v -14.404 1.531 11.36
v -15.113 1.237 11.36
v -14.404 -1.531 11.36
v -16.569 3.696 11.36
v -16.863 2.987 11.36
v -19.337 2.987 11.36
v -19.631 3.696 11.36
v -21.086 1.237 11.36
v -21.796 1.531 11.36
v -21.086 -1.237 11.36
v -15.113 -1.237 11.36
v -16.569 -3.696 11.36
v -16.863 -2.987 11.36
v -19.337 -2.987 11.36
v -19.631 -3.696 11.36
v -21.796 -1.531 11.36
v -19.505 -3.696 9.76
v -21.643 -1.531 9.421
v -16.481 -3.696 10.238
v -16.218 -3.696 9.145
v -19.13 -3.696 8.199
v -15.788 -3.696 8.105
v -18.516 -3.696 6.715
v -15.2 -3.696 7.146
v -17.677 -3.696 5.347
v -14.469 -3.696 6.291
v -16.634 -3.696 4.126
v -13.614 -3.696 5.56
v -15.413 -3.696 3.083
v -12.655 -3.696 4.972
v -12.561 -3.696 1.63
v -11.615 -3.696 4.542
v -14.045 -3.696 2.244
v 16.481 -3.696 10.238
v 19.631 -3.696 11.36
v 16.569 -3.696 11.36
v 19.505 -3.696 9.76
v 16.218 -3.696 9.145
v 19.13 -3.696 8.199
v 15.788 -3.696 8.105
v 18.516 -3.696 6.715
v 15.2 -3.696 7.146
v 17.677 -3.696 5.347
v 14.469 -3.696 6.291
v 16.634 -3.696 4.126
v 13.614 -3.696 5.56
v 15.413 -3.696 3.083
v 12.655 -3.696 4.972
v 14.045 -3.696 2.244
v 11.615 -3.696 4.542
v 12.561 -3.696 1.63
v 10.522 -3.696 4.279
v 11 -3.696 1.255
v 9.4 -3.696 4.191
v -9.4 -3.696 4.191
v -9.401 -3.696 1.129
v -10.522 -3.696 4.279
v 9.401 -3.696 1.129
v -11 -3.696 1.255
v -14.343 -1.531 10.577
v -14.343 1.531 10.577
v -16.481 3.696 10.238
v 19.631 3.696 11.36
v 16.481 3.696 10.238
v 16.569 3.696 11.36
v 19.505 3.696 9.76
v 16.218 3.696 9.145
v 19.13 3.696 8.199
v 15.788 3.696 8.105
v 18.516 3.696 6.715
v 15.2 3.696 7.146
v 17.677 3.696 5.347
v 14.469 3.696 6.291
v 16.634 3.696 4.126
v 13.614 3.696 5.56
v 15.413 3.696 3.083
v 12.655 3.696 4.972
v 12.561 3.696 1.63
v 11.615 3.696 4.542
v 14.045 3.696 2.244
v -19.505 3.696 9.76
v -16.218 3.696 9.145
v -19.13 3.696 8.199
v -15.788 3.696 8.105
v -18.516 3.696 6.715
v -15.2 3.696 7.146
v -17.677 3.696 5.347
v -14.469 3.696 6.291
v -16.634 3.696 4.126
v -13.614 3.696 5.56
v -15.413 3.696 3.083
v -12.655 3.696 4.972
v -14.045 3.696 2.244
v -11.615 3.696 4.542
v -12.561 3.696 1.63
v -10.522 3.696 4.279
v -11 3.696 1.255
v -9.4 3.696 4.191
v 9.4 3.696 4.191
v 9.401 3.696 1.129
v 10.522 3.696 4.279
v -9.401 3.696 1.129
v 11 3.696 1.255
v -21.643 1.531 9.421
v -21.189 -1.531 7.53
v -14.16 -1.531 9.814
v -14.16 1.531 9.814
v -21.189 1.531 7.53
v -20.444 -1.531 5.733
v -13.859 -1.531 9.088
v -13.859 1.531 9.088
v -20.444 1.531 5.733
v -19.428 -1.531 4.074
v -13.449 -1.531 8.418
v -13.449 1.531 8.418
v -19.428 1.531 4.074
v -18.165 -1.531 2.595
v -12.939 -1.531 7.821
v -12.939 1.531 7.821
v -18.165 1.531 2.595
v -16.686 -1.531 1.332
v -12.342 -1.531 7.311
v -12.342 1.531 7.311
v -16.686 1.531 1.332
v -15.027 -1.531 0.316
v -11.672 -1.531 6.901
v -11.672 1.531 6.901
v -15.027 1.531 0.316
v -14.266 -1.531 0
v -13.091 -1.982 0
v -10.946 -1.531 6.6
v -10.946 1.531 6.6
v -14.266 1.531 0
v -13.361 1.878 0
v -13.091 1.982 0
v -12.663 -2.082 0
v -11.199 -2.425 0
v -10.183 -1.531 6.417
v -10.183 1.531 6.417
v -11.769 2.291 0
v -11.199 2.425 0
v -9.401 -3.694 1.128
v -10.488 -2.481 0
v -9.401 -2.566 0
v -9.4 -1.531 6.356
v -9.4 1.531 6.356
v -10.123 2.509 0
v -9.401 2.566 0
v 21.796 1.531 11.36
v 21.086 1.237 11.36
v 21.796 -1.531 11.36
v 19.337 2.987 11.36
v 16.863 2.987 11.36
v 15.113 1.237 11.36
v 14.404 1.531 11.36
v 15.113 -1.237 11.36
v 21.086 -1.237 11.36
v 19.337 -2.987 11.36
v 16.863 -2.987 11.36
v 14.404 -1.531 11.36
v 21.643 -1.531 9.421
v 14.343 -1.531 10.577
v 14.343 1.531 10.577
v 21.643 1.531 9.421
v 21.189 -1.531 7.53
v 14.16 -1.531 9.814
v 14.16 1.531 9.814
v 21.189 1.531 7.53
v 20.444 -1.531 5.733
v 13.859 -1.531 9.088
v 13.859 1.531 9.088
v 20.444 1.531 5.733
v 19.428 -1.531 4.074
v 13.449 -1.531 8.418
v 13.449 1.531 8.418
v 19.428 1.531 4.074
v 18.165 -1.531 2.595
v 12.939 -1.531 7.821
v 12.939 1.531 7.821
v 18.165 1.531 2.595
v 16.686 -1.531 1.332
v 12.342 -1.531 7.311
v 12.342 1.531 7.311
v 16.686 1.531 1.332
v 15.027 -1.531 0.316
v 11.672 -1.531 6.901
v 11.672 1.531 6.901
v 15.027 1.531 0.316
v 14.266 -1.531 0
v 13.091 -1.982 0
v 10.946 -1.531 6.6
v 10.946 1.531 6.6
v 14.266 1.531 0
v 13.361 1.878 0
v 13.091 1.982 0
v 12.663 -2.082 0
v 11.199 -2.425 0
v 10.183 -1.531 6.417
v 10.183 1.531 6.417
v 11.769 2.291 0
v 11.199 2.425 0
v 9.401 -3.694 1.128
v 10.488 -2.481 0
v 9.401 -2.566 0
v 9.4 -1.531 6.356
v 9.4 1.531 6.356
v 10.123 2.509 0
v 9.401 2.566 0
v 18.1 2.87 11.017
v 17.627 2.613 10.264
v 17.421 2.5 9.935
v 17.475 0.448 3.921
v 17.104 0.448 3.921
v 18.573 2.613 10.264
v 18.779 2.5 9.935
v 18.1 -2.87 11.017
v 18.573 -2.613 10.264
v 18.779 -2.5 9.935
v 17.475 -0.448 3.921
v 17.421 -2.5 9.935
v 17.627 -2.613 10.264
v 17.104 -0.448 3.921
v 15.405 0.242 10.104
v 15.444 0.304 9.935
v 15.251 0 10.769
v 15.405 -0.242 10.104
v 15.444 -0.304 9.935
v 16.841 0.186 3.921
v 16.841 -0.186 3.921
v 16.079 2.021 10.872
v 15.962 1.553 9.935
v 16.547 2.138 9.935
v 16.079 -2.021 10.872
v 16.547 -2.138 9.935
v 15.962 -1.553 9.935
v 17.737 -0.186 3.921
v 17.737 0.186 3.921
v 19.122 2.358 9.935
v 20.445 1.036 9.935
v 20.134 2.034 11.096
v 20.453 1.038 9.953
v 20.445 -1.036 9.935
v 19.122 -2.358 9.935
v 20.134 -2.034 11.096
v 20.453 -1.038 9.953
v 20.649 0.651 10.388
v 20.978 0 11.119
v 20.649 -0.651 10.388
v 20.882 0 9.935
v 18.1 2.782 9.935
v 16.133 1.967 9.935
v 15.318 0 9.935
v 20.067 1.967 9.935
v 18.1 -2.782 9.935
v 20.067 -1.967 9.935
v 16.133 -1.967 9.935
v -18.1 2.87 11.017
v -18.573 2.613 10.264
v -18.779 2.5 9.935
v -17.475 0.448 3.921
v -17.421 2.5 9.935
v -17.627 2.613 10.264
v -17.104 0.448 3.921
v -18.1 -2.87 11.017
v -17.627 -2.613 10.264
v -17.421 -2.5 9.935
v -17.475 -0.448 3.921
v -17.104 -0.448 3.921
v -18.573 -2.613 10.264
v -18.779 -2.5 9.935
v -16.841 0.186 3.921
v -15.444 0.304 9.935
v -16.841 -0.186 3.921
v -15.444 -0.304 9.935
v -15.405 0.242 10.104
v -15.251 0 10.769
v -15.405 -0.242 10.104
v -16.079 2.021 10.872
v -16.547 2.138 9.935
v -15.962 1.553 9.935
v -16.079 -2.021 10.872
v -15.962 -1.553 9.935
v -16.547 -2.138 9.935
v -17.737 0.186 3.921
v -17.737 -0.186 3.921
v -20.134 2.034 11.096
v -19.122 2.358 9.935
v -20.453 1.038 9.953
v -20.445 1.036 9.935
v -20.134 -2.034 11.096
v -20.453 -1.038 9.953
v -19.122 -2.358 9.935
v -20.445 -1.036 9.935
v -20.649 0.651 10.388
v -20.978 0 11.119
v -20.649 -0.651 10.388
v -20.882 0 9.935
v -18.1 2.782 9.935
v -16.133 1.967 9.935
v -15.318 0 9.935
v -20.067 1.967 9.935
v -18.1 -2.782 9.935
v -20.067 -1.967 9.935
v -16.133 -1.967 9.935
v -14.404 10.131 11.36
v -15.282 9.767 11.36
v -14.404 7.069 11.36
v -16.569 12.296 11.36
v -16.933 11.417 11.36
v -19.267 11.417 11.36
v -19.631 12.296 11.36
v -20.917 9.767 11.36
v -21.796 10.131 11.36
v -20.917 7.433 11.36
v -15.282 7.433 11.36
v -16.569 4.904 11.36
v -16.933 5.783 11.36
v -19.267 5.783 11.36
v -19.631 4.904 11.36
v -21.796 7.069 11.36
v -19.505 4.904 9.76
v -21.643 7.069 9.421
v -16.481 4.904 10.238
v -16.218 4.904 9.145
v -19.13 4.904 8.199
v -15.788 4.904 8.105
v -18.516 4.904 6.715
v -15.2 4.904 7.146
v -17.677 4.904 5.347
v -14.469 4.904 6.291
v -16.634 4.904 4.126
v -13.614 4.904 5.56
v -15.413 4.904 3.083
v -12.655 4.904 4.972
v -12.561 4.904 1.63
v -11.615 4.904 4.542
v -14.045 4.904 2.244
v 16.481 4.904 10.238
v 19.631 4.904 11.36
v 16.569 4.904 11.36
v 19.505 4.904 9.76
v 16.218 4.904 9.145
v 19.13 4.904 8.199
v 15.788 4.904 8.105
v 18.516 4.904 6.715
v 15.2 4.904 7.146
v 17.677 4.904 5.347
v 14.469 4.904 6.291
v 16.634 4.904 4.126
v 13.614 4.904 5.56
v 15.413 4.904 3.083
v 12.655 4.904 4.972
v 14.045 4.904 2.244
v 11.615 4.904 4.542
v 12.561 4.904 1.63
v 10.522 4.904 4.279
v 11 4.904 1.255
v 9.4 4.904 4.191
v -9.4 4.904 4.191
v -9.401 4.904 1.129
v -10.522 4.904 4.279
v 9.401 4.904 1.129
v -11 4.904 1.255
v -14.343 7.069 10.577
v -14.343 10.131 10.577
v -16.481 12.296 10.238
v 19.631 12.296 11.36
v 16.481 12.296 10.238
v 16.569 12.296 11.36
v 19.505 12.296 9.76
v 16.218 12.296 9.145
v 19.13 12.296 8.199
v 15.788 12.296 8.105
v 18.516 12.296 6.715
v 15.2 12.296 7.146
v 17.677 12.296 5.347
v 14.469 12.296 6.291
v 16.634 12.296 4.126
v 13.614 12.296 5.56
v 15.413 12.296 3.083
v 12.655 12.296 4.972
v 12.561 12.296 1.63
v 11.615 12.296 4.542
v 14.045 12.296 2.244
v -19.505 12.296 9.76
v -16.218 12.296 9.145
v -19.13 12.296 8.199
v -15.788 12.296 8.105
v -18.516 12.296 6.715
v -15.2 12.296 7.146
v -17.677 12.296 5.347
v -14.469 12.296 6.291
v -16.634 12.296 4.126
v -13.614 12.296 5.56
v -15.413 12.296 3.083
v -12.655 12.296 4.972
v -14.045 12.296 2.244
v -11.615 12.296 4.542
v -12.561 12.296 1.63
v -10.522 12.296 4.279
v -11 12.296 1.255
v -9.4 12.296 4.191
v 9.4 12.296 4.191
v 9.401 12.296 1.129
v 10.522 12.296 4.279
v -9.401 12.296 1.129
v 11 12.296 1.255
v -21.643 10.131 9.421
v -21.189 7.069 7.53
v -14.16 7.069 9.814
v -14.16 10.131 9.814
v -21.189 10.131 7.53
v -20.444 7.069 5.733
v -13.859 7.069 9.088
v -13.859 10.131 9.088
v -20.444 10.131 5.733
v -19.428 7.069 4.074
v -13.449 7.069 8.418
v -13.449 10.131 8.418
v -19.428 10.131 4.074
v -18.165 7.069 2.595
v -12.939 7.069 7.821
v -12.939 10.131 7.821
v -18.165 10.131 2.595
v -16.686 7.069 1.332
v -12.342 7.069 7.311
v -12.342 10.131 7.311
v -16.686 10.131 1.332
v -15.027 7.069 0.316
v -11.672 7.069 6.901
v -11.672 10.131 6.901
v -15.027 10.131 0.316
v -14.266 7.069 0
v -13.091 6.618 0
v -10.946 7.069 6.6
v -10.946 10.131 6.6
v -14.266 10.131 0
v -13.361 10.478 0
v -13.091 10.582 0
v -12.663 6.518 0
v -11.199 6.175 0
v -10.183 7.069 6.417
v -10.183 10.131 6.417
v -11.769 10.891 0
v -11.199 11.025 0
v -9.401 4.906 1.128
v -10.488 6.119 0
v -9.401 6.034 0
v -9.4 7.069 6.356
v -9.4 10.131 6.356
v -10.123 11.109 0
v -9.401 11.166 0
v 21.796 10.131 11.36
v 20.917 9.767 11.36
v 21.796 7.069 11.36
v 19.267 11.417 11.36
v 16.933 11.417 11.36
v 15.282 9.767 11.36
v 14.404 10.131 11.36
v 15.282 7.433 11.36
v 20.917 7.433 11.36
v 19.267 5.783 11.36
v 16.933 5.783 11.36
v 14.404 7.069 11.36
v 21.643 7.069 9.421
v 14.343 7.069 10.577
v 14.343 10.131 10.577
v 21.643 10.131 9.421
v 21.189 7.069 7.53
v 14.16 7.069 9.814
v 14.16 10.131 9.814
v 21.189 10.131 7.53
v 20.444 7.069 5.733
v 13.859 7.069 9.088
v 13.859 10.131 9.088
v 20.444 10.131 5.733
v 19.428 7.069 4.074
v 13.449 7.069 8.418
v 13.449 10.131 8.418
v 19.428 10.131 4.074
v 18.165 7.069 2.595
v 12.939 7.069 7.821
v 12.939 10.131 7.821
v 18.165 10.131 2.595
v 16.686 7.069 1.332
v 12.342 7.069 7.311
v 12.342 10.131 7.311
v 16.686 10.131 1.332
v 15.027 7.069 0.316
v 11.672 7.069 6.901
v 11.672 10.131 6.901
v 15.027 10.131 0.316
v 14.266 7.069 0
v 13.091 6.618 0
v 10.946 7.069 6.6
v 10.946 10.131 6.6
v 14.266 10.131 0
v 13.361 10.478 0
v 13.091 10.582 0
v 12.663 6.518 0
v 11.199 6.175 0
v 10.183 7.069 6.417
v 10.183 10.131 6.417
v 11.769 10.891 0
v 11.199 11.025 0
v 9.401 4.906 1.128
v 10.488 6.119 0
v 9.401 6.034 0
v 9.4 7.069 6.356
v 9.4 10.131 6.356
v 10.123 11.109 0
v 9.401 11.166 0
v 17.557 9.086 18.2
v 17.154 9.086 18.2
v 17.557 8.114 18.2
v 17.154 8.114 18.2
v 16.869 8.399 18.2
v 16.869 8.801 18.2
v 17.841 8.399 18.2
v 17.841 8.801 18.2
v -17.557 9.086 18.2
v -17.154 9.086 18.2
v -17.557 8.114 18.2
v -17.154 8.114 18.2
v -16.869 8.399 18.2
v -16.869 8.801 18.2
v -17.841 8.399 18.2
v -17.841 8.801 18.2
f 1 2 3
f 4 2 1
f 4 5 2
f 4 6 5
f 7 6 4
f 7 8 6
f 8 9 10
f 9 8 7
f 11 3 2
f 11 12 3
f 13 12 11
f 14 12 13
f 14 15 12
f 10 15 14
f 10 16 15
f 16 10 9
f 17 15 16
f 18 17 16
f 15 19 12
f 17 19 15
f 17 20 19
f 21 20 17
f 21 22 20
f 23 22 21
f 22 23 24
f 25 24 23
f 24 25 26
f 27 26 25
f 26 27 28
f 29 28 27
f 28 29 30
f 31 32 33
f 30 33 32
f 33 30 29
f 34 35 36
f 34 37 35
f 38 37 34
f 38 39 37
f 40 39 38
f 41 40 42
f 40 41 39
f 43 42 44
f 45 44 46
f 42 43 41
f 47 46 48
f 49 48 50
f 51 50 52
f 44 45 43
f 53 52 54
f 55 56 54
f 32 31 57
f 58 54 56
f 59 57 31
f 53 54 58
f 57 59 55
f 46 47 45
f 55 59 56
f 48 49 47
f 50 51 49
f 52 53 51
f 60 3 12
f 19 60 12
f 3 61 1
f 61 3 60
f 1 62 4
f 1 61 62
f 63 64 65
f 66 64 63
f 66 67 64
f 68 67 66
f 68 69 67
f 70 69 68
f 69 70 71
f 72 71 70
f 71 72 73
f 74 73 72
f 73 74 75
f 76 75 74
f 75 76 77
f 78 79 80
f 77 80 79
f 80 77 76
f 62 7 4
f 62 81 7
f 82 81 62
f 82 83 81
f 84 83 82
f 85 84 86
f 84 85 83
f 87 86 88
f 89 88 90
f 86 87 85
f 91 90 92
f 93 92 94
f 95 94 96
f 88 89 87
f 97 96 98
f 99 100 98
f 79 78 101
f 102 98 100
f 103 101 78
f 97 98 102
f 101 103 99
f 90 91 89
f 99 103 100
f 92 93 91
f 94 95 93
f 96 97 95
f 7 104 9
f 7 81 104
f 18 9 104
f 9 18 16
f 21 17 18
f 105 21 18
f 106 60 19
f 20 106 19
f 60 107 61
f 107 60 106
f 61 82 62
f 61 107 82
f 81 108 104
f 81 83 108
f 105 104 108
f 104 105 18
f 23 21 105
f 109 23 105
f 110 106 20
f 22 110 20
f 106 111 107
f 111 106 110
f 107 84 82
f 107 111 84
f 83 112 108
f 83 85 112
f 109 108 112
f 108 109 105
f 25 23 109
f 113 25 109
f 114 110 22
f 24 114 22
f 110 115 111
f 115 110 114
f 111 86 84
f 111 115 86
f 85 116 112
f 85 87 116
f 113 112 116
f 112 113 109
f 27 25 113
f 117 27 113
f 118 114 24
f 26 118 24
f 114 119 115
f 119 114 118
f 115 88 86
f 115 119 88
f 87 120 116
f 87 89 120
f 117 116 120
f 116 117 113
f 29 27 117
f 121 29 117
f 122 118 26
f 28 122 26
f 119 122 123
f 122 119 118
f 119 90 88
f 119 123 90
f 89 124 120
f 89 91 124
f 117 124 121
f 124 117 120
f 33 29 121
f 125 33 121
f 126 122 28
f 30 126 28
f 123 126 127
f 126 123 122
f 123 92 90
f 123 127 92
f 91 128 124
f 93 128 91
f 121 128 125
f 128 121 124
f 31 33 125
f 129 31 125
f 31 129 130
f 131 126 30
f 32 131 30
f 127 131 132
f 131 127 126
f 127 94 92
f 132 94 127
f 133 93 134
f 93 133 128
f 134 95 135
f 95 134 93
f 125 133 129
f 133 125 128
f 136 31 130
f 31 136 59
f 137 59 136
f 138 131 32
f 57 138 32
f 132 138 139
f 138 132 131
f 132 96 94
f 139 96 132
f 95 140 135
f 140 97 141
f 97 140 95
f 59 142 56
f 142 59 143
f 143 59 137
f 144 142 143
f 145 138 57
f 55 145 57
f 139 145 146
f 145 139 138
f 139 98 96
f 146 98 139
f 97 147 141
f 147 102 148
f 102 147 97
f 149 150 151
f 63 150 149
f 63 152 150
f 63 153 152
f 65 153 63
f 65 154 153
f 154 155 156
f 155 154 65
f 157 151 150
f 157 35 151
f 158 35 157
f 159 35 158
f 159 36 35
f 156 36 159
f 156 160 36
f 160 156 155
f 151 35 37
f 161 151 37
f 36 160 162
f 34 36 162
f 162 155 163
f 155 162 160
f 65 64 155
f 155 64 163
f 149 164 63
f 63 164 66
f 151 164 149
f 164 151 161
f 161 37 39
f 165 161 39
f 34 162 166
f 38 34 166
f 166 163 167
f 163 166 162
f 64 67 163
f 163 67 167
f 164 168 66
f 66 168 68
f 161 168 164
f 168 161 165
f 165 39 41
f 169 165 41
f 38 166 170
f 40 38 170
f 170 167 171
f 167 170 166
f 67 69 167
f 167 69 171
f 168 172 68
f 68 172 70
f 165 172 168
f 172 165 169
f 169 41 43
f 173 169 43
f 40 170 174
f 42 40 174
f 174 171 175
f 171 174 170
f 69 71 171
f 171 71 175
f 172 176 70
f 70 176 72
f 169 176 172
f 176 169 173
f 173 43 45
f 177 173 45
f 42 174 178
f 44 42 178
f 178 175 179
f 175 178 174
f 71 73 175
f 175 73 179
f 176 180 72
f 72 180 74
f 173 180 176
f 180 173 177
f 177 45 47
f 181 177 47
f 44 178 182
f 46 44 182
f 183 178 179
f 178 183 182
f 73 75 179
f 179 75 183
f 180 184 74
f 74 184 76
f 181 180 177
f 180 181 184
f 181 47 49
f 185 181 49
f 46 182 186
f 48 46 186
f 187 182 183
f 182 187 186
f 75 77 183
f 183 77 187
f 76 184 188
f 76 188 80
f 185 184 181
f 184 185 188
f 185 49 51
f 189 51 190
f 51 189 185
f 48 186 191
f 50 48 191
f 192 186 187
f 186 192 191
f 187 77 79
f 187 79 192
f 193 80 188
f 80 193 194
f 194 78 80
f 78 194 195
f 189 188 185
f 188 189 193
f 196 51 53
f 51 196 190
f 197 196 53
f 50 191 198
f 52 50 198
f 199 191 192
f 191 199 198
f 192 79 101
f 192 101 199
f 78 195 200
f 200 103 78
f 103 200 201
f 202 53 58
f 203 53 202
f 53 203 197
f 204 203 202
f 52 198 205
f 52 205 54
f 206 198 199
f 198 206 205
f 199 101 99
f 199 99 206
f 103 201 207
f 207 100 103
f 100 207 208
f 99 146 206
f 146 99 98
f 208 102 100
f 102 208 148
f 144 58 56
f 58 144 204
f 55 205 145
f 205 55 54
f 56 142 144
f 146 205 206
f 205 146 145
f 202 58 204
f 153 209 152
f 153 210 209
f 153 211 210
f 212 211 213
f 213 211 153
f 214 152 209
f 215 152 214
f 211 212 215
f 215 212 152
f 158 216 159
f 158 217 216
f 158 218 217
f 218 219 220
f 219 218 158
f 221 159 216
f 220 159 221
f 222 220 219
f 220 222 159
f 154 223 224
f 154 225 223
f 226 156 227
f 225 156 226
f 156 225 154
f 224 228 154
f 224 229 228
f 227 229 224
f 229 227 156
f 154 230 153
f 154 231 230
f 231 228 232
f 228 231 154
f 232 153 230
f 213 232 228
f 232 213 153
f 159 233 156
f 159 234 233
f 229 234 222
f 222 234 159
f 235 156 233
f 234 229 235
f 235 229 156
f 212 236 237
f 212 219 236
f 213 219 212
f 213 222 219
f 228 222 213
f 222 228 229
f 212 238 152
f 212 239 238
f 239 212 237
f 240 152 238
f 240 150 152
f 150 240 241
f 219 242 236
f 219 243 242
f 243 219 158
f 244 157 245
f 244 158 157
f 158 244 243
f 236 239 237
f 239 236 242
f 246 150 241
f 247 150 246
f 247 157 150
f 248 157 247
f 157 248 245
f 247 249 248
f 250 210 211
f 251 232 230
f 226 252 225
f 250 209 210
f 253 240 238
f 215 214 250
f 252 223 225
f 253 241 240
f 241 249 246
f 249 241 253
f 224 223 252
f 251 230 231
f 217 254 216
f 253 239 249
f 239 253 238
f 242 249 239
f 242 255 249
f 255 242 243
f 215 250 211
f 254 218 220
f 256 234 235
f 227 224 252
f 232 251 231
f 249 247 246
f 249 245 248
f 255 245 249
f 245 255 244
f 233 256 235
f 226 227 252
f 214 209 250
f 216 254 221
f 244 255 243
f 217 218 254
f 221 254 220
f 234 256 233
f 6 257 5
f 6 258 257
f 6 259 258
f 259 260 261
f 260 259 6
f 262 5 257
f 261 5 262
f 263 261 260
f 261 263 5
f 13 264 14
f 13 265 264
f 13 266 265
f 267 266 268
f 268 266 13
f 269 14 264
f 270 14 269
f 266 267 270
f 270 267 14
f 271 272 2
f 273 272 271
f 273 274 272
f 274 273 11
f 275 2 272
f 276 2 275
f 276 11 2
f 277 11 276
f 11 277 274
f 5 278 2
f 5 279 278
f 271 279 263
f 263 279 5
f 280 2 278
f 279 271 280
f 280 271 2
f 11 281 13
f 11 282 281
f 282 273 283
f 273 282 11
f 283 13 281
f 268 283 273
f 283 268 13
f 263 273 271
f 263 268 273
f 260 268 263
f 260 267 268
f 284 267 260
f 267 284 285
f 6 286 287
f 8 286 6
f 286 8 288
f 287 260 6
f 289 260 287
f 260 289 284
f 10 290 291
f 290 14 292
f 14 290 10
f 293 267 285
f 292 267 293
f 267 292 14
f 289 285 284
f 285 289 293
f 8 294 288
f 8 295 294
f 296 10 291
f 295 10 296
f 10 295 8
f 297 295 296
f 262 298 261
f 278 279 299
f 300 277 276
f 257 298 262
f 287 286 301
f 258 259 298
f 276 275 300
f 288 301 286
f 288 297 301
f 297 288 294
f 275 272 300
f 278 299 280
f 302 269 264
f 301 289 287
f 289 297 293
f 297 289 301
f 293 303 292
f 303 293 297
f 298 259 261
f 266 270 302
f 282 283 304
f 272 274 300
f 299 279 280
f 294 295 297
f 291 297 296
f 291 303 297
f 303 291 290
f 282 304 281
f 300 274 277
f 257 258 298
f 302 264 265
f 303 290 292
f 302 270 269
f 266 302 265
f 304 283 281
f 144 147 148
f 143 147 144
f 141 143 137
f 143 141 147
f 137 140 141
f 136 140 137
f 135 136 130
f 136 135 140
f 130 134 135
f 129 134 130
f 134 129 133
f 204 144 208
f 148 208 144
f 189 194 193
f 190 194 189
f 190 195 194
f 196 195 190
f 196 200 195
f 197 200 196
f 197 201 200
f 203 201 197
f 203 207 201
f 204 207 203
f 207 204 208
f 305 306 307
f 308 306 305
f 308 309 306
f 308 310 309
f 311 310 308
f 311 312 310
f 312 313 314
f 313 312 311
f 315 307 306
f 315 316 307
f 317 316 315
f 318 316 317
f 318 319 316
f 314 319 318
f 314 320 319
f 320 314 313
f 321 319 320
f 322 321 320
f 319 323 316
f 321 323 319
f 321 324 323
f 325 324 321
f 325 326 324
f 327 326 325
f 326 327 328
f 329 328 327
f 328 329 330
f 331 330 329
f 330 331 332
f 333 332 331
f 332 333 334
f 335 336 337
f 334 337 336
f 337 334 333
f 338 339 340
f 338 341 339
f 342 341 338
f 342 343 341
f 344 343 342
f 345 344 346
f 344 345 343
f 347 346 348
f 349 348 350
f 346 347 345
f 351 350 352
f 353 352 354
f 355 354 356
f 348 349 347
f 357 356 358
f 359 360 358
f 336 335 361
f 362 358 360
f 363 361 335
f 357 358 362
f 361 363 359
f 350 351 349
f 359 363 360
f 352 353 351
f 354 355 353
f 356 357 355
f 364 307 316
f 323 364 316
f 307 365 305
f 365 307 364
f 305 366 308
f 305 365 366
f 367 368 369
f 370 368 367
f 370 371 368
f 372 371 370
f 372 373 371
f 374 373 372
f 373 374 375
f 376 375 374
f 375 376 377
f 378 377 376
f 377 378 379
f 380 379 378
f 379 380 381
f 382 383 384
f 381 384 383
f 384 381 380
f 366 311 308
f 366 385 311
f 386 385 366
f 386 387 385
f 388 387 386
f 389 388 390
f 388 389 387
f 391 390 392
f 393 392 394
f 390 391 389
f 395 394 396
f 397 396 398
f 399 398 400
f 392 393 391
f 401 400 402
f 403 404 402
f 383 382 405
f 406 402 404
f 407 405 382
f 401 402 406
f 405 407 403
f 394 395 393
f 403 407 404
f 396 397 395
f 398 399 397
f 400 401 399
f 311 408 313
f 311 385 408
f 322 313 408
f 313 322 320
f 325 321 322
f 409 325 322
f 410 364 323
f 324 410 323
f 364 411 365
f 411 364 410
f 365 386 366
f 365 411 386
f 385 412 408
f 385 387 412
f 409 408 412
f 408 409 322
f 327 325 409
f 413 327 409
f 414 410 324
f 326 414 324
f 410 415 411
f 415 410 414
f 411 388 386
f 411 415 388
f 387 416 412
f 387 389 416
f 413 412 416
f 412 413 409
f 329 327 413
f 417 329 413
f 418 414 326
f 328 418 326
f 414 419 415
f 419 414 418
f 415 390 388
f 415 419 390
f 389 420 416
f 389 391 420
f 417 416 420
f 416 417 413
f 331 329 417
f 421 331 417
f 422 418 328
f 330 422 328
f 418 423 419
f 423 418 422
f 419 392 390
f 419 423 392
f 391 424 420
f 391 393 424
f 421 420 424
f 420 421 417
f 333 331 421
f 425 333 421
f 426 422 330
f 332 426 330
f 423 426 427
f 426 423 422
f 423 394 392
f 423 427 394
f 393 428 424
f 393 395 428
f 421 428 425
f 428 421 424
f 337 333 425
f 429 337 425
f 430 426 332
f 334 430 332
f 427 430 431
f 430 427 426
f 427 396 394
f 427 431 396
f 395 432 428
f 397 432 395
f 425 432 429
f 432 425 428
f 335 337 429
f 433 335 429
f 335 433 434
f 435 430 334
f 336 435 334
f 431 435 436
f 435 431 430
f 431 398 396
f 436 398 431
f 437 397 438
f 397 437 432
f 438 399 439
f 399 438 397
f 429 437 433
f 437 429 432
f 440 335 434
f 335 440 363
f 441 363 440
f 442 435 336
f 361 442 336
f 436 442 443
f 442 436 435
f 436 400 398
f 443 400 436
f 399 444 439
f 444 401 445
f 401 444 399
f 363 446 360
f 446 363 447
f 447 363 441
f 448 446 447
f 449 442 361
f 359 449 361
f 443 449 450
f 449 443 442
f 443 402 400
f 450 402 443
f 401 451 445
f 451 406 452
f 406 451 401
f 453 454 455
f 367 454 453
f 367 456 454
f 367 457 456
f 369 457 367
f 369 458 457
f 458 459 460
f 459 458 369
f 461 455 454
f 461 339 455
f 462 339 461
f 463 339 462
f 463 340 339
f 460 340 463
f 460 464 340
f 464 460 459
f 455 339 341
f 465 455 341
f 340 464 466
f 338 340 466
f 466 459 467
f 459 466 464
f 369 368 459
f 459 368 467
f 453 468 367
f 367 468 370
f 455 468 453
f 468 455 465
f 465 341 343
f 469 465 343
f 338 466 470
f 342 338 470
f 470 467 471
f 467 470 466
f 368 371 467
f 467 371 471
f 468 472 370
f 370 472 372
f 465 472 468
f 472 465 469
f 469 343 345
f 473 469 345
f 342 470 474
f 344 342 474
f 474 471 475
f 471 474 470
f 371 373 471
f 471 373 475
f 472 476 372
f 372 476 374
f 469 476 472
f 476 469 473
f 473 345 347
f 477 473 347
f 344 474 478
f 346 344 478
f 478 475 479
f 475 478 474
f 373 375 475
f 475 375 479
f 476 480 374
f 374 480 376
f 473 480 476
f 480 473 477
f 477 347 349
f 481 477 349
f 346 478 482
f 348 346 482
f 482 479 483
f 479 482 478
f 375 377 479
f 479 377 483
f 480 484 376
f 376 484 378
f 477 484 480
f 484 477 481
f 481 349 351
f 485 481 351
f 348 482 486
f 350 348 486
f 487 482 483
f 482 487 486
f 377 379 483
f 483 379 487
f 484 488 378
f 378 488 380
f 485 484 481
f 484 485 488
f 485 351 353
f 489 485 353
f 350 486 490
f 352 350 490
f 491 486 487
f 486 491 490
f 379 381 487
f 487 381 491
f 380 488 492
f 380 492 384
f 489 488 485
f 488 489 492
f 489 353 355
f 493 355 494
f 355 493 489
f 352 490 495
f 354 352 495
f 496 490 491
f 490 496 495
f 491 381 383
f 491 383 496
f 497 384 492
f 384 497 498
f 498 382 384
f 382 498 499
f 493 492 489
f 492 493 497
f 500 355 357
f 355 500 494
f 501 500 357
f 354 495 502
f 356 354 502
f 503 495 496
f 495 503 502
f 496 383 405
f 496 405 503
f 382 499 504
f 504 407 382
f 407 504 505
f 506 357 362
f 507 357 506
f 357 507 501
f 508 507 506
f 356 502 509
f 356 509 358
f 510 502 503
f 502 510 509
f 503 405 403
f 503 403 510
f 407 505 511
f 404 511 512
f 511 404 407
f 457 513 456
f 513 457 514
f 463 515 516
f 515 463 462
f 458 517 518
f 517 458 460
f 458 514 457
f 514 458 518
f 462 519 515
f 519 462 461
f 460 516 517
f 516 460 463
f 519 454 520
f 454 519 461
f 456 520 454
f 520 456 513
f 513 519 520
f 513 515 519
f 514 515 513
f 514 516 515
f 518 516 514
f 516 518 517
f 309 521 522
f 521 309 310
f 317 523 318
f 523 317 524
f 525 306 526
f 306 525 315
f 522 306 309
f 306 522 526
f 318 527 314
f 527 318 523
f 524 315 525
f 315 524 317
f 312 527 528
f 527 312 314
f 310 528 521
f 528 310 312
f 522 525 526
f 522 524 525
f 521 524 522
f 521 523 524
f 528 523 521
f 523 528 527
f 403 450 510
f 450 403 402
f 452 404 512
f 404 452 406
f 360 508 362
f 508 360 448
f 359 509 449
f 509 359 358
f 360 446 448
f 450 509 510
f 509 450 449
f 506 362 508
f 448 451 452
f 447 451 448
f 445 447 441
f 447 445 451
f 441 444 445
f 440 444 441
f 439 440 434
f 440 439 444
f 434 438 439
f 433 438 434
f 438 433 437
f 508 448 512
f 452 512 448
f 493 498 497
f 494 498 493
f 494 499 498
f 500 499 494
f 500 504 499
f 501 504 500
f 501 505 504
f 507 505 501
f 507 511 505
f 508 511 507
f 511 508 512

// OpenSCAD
gauge = 8;
gap_width = 9.4;
gap_length = gap_width * 2;

module half_link(male=true) {
  $fn = 40;

  difference() {
    union() {
      for (a = [-1, 1])
      scale([a, 1, 1])
      translate([gap_length/2, 0])
      rotate_extrude(angle=90)
      translate([gauge/2 + gap_width/2, 0])
      rotate([0, 0, 360/16])
      circle($fn=8, d=gauge);
      
      translate([-gap_length/2, gap_width/2 + gauge/2])
      rotate([0, 90])
      translate([0, 0, -0.001])
      rotate([0, 0, 360/16])
      cylinder($fn=8, d=gauge, h=gap_length+0.002);
      
      if (male)
      for (a = [-1, 1])
      scale([a, 1, 1])
      interface();
    }
    
    if(!male)
    for (a = [-1, 1])
    scale([a, -1, 1])
    interface(cav=true);
  }
}

module interface(cav=false) {
  $fn = 8;

  d = gauge-1.9;
  h = gauge*0.93;
  tilt = 0.9;

  translate([-gap_length/2 - gap_width/2 - gauge/2, 0])
  rotate([90, 0, 0])
  intersection() {
    union() {
      scale([1, 1, 0] * (cav ? 1.06 : 1) + [0, 0, 1])
      translate([tilt, 0, -0.001])
      linear_extrude(h, scale=(cav ? 0.15 : 0.1))
      translate([-tilt, 0])
      rotate([0, 0, 360/16])
      circle(d=d);
      
      // Runnels.
      if(cav)
      scale([1, 1, 1] * 0.95)
      linear_extrude(1.5, scale=0.96)
      circle(d=d);
    }
    
    // Truncate the pyramid.
    if(!cav)
    translate([0, 0, h-50-0.6])
    cube(100, center=true);
  }
}

module printable_half_link(male=true) {
  intersection() {
    translate([0, 0, gauge*1.42])
    rotate([-90, 0, 0])
    half_link(male);
    
    translate([0, 0, 50])
    cube(100, center=true);
  }
}

module interface_preview() {
  interface();

  color("blue")
  translate([1, 0])
  interface(true);
}

module print() {
  printable_half_link(false);
  translate([0, gauge+0.6])
  printable_half_link(true);
}

print();
